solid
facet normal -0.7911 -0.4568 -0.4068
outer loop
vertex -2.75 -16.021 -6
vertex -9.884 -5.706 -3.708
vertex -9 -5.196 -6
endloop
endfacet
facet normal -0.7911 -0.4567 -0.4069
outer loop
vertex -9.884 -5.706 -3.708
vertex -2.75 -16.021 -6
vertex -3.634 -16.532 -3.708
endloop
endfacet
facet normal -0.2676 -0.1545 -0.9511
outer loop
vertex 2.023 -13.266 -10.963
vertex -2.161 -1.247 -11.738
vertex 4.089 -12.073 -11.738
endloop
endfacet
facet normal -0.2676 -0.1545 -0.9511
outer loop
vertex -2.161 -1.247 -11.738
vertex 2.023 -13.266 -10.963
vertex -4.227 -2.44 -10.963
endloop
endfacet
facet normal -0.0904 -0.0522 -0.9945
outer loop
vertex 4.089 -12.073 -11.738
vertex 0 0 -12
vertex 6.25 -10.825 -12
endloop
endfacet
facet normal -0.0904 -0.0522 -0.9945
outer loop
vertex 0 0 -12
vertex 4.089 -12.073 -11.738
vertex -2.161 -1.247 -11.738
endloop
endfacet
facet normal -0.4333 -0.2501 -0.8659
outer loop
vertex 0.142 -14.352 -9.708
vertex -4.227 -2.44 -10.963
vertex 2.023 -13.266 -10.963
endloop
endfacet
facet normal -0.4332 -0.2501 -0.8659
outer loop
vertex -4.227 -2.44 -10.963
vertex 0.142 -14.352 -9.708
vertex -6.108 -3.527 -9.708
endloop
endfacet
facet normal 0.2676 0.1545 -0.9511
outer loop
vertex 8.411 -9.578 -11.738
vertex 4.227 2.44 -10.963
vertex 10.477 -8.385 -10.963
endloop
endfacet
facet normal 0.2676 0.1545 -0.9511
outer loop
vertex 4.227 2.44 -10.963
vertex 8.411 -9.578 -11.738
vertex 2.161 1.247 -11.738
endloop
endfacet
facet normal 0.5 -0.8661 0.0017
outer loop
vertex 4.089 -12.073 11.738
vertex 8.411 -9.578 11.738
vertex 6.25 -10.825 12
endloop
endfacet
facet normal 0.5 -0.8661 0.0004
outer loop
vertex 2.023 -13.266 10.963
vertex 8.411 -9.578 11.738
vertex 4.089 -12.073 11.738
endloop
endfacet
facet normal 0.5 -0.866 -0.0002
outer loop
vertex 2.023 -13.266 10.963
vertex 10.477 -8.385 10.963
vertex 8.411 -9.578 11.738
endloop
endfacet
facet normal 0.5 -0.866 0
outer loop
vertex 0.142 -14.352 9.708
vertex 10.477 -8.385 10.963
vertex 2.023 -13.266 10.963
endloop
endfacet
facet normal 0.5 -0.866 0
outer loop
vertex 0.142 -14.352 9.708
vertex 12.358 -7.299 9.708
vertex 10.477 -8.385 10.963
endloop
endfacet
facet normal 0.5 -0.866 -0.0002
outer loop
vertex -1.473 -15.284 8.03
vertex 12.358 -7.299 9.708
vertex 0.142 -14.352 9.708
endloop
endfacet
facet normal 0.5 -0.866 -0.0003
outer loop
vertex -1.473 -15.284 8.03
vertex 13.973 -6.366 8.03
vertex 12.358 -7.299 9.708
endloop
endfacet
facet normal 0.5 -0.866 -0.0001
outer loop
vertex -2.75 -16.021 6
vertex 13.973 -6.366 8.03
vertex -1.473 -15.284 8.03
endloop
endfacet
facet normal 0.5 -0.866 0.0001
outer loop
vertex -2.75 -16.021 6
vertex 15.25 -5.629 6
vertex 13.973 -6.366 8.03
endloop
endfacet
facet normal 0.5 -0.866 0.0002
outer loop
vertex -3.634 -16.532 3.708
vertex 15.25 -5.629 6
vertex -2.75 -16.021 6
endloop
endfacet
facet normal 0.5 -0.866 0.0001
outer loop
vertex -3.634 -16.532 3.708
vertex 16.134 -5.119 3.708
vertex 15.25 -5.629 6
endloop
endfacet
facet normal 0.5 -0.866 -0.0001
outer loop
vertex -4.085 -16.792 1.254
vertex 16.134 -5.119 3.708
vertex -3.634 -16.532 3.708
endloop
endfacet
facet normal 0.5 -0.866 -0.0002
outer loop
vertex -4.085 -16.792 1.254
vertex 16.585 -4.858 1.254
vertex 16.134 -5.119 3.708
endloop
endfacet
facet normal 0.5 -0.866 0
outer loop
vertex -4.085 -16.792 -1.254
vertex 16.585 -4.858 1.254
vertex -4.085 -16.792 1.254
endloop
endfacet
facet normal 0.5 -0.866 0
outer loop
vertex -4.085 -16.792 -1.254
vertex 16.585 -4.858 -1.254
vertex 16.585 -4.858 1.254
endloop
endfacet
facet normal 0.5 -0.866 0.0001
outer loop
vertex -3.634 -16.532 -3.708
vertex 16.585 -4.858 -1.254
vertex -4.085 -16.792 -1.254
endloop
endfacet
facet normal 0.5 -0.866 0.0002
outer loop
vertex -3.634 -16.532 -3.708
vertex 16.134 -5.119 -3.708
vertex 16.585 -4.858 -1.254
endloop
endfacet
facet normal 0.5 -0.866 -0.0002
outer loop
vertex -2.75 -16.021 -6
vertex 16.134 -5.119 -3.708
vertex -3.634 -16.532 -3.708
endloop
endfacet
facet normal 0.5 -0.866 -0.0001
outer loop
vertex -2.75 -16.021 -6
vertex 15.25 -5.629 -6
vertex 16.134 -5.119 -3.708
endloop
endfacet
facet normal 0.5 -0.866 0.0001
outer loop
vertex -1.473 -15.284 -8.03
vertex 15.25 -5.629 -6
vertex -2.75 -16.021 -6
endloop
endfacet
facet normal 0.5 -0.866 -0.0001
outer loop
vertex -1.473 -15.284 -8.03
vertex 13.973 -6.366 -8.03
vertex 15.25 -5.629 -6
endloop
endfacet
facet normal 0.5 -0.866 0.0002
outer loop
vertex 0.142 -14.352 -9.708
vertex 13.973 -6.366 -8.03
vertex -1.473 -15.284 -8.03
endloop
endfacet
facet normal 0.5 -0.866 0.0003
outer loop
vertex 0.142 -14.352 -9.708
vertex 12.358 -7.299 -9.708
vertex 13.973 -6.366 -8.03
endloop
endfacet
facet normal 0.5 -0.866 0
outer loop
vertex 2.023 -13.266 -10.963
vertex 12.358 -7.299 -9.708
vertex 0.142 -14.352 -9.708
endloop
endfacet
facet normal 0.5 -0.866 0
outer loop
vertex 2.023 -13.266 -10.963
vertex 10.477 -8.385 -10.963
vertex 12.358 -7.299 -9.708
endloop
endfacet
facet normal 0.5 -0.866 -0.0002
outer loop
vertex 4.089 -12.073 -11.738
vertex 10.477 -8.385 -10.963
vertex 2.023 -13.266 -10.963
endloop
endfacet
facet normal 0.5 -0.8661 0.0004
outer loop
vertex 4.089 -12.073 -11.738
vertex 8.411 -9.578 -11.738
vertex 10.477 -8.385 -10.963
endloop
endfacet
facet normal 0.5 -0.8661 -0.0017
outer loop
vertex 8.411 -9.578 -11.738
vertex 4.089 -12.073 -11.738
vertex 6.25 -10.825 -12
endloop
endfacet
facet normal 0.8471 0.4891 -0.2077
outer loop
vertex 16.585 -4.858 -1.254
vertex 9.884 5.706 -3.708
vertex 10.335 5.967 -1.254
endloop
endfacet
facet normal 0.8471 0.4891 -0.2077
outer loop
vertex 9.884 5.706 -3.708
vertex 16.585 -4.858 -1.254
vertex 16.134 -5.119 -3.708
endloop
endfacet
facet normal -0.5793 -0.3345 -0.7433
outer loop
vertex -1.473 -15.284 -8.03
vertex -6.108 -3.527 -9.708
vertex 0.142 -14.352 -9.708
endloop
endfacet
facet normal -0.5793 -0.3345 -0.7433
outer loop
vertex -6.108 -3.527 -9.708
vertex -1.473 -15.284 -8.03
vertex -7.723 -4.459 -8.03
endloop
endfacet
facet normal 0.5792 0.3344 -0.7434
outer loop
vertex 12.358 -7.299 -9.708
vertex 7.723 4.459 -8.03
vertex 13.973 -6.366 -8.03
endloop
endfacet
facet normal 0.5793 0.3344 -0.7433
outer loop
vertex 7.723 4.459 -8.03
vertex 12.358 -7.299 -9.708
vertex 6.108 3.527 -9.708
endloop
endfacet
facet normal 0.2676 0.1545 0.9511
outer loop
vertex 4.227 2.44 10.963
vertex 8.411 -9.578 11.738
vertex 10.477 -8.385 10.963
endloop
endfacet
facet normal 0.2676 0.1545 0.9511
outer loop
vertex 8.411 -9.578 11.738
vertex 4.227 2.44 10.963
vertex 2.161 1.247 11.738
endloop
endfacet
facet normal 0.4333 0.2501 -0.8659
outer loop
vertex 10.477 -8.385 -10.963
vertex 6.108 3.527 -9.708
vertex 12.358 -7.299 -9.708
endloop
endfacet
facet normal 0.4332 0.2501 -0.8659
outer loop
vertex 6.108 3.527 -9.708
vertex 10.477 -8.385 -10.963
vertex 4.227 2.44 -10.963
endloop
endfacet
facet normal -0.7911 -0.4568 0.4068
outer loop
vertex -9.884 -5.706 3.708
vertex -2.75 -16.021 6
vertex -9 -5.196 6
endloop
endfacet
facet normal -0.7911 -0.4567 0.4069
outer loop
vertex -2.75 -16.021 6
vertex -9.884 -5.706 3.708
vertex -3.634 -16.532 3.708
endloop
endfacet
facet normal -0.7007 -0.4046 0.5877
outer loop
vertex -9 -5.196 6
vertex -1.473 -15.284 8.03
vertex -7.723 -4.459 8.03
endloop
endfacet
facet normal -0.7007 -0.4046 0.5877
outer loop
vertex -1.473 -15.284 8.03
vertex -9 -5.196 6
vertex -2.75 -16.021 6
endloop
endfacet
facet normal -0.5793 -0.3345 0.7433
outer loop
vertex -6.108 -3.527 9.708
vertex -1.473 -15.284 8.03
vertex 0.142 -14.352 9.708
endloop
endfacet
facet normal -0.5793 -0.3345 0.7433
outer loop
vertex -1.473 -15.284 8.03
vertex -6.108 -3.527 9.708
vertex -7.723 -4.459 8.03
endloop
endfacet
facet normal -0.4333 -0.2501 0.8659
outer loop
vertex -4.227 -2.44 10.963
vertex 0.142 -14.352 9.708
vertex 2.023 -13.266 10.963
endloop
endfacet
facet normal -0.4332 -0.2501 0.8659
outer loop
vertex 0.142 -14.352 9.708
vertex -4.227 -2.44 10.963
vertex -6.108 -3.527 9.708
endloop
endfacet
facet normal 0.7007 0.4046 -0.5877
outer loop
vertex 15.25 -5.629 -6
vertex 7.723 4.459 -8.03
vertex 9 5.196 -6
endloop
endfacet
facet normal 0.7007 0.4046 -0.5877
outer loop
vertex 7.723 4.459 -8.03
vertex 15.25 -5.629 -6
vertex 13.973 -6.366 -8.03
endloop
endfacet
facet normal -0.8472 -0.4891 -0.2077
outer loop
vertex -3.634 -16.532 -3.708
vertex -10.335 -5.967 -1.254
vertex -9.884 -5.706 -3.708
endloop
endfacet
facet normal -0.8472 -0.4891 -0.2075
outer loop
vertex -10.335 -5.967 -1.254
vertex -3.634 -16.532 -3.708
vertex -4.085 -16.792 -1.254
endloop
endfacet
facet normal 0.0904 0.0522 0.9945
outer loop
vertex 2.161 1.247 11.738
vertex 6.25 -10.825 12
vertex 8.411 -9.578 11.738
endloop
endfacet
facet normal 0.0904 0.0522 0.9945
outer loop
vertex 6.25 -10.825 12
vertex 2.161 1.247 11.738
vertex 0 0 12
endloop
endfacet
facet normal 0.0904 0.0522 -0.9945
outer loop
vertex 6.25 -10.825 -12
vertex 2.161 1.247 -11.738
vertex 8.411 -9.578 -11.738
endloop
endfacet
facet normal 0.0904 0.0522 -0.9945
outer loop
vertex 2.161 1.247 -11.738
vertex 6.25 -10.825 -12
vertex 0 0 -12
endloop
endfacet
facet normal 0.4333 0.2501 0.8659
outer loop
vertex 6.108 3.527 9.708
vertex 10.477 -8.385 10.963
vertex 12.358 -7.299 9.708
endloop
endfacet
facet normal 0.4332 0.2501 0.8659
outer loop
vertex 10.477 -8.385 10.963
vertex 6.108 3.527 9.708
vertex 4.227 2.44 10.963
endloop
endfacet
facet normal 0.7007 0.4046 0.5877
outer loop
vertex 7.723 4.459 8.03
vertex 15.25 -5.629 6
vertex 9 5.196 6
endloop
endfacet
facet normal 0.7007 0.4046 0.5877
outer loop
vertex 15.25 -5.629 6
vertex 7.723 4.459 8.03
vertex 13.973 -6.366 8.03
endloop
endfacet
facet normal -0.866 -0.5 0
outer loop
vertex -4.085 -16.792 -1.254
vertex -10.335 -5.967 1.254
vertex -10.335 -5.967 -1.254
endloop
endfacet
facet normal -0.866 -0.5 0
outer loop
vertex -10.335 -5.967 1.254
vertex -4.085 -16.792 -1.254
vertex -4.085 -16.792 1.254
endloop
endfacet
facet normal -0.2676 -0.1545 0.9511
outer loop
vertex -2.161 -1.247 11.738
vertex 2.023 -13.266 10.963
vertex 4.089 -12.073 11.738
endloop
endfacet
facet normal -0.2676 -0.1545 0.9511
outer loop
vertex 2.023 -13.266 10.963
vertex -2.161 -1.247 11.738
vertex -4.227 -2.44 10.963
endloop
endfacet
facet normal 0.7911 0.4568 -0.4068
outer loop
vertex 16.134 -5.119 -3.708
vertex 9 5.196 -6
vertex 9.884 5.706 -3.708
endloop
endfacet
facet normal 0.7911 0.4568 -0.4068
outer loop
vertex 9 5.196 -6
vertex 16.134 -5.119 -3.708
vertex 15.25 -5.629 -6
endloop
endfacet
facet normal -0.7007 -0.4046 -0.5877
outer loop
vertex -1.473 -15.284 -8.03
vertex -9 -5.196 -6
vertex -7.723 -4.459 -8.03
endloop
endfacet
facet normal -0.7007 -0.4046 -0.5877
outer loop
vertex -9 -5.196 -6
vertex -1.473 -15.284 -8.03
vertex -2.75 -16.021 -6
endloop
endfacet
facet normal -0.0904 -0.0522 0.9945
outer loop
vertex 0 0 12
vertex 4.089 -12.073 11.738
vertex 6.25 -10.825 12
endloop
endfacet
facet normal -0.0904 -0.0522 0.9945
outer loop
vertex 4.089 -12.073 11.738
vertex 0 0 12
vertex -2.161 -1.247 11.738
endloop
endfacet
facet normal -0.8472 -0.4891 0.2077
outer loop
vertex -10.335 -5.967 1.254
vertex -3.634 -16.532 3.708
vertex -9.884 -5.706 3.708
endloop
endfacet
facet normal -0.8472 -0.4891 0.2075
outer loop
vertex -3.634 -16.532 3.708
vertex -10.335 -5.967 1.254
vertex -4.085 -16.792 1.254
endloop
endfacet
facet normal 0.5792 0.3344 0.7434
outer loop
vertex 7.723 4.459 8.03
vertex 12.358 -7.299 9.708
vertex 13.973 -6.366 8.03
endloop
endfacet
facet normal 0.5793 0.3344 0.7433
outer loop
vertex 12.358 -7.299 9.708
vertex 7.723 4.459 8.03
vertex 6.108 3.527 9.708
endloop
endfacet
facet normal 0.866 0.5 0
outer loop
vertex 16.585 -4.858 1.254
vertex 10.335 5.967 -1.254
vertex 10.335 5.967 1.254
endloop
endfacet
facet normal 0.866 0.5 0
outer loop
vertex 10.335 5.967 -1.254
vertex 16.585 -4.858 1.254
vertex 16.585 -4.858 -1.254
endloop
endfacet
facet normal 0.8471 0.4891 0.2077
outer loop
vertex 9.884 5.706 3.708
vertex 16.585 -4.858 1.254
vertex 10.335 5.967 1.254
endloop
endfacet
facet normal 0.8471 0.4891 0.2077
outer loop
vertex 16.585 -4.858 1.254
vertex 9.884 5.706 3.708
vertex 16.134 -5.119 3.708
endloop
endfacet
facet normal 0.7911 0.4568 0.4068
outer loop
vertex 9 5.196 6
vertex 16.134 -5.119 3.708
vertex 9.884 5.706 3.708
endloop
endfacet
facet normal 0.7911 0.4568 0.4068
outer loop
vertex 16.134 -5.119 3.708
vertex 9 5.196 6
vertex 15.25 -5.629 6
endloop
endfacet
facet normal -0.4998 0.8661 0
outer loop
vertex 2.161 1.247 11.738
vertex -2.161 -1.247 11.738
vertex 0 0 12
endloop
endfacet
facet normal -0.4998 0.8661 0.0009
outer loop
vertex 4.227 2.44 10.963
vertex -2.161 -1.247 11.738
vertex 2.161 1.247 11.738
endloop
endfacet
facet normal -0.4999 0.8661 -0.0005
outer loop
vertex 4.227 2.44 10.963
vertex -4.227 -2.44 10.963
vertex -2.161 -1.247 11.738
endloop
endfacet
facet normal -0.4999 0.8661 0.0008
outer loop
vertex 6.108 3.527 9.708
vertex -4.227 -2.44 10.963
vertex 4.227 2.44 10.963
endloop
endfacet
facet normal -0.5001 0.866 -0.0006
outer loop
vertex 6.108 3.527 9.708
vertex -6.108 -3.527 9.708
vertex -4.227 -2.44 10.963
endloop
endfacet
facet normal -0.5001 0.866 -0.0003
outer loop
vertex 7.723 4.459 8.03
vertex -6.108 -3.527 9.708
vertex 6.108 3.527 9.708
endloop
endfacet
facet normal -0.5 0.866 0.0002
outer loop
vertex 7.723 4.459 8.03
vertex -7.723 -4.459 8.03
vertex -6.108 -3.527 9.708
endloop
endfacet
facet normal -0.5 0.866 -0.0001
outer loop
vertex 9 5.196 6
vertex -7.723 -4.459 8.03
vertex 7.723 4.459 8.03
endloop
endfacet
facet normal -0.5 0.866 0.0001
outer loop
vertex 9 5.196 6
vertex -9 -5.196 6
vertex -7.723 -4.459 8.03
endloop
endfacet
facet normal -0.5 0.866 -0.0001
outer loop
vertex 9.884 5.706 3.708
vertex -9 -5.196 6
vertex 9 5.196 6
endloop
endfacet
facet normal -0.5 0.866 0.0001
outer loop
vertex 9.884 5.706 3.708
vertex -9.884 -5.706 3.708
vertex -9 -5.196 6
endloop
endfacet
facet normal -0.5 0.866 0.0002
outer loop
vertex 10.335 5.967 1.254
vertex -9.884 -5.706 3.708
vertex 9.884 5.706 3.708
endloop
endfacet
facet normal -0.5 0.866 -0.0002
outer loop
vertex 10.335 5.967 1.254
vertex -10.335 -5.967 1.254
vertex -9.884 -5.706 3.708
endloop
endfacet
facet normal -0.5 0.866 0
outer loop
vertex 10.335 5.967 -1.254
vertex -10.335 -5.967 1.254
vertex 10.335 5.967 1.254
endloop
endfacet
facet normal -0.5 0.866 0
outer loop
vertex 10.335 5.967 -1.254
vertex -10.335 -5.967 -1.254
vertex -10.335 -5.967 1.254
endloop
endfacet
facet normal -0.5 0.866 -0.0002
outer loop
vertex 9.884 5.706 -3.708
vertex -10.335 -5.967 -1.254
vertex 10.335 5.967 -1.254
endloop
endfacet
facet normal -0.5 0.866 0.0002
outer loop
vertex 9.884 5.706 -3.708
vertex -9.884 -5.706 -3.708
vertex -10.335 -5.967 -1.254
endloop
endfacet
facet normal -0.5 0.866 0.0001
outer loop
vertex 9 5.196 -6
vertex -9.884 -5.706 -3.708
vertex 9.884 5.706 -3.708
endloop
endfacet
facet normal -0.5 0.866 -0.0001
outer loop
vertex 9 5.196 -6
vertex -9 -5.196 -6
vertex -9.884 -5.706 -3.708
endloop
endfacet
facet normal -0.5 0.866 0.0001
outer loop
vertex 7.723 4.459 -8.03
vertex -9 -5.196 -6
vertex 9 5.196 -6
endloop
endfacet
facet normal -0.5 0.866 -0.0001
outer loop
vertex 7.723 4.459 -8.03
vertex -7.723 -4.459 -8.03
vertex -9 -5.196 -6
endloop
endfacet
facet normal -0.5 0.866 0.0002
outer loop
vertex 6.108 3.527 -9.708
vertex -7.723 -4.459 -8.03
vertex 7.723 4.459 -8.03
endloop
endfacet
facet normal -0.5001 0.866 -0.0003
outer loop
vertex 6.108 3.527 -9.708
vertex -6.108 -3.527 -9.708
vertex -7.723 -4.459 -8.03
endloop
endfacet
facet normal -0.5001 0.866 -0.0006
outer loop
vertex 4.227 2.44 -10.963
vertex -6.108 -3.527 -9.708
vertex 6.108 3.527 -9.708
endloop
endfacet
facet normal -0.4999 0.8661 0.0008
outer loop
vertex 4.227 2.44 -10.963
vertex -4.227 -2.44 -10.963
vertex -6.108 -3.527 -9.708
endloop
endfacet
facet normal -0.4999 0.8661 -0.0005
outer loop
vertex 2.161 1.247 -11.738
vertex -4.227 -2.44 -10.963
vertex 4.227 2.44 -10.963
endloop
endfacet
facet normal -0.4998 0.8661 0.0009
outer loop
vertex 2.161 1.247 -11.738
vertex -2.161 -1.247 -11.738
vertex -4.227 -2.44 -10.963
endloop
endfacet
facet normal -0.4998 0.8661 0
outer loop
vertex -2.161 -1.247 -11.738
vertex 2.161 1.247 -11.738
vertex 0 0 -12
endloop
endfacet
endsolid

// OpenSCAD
// Generated by generate_scads.py
rotate([0,90,120]) {
  difference() {
    cylinder(h=25, r=12, center=true);
    cylinder(h=15, r=12, center=false);
  }
}
